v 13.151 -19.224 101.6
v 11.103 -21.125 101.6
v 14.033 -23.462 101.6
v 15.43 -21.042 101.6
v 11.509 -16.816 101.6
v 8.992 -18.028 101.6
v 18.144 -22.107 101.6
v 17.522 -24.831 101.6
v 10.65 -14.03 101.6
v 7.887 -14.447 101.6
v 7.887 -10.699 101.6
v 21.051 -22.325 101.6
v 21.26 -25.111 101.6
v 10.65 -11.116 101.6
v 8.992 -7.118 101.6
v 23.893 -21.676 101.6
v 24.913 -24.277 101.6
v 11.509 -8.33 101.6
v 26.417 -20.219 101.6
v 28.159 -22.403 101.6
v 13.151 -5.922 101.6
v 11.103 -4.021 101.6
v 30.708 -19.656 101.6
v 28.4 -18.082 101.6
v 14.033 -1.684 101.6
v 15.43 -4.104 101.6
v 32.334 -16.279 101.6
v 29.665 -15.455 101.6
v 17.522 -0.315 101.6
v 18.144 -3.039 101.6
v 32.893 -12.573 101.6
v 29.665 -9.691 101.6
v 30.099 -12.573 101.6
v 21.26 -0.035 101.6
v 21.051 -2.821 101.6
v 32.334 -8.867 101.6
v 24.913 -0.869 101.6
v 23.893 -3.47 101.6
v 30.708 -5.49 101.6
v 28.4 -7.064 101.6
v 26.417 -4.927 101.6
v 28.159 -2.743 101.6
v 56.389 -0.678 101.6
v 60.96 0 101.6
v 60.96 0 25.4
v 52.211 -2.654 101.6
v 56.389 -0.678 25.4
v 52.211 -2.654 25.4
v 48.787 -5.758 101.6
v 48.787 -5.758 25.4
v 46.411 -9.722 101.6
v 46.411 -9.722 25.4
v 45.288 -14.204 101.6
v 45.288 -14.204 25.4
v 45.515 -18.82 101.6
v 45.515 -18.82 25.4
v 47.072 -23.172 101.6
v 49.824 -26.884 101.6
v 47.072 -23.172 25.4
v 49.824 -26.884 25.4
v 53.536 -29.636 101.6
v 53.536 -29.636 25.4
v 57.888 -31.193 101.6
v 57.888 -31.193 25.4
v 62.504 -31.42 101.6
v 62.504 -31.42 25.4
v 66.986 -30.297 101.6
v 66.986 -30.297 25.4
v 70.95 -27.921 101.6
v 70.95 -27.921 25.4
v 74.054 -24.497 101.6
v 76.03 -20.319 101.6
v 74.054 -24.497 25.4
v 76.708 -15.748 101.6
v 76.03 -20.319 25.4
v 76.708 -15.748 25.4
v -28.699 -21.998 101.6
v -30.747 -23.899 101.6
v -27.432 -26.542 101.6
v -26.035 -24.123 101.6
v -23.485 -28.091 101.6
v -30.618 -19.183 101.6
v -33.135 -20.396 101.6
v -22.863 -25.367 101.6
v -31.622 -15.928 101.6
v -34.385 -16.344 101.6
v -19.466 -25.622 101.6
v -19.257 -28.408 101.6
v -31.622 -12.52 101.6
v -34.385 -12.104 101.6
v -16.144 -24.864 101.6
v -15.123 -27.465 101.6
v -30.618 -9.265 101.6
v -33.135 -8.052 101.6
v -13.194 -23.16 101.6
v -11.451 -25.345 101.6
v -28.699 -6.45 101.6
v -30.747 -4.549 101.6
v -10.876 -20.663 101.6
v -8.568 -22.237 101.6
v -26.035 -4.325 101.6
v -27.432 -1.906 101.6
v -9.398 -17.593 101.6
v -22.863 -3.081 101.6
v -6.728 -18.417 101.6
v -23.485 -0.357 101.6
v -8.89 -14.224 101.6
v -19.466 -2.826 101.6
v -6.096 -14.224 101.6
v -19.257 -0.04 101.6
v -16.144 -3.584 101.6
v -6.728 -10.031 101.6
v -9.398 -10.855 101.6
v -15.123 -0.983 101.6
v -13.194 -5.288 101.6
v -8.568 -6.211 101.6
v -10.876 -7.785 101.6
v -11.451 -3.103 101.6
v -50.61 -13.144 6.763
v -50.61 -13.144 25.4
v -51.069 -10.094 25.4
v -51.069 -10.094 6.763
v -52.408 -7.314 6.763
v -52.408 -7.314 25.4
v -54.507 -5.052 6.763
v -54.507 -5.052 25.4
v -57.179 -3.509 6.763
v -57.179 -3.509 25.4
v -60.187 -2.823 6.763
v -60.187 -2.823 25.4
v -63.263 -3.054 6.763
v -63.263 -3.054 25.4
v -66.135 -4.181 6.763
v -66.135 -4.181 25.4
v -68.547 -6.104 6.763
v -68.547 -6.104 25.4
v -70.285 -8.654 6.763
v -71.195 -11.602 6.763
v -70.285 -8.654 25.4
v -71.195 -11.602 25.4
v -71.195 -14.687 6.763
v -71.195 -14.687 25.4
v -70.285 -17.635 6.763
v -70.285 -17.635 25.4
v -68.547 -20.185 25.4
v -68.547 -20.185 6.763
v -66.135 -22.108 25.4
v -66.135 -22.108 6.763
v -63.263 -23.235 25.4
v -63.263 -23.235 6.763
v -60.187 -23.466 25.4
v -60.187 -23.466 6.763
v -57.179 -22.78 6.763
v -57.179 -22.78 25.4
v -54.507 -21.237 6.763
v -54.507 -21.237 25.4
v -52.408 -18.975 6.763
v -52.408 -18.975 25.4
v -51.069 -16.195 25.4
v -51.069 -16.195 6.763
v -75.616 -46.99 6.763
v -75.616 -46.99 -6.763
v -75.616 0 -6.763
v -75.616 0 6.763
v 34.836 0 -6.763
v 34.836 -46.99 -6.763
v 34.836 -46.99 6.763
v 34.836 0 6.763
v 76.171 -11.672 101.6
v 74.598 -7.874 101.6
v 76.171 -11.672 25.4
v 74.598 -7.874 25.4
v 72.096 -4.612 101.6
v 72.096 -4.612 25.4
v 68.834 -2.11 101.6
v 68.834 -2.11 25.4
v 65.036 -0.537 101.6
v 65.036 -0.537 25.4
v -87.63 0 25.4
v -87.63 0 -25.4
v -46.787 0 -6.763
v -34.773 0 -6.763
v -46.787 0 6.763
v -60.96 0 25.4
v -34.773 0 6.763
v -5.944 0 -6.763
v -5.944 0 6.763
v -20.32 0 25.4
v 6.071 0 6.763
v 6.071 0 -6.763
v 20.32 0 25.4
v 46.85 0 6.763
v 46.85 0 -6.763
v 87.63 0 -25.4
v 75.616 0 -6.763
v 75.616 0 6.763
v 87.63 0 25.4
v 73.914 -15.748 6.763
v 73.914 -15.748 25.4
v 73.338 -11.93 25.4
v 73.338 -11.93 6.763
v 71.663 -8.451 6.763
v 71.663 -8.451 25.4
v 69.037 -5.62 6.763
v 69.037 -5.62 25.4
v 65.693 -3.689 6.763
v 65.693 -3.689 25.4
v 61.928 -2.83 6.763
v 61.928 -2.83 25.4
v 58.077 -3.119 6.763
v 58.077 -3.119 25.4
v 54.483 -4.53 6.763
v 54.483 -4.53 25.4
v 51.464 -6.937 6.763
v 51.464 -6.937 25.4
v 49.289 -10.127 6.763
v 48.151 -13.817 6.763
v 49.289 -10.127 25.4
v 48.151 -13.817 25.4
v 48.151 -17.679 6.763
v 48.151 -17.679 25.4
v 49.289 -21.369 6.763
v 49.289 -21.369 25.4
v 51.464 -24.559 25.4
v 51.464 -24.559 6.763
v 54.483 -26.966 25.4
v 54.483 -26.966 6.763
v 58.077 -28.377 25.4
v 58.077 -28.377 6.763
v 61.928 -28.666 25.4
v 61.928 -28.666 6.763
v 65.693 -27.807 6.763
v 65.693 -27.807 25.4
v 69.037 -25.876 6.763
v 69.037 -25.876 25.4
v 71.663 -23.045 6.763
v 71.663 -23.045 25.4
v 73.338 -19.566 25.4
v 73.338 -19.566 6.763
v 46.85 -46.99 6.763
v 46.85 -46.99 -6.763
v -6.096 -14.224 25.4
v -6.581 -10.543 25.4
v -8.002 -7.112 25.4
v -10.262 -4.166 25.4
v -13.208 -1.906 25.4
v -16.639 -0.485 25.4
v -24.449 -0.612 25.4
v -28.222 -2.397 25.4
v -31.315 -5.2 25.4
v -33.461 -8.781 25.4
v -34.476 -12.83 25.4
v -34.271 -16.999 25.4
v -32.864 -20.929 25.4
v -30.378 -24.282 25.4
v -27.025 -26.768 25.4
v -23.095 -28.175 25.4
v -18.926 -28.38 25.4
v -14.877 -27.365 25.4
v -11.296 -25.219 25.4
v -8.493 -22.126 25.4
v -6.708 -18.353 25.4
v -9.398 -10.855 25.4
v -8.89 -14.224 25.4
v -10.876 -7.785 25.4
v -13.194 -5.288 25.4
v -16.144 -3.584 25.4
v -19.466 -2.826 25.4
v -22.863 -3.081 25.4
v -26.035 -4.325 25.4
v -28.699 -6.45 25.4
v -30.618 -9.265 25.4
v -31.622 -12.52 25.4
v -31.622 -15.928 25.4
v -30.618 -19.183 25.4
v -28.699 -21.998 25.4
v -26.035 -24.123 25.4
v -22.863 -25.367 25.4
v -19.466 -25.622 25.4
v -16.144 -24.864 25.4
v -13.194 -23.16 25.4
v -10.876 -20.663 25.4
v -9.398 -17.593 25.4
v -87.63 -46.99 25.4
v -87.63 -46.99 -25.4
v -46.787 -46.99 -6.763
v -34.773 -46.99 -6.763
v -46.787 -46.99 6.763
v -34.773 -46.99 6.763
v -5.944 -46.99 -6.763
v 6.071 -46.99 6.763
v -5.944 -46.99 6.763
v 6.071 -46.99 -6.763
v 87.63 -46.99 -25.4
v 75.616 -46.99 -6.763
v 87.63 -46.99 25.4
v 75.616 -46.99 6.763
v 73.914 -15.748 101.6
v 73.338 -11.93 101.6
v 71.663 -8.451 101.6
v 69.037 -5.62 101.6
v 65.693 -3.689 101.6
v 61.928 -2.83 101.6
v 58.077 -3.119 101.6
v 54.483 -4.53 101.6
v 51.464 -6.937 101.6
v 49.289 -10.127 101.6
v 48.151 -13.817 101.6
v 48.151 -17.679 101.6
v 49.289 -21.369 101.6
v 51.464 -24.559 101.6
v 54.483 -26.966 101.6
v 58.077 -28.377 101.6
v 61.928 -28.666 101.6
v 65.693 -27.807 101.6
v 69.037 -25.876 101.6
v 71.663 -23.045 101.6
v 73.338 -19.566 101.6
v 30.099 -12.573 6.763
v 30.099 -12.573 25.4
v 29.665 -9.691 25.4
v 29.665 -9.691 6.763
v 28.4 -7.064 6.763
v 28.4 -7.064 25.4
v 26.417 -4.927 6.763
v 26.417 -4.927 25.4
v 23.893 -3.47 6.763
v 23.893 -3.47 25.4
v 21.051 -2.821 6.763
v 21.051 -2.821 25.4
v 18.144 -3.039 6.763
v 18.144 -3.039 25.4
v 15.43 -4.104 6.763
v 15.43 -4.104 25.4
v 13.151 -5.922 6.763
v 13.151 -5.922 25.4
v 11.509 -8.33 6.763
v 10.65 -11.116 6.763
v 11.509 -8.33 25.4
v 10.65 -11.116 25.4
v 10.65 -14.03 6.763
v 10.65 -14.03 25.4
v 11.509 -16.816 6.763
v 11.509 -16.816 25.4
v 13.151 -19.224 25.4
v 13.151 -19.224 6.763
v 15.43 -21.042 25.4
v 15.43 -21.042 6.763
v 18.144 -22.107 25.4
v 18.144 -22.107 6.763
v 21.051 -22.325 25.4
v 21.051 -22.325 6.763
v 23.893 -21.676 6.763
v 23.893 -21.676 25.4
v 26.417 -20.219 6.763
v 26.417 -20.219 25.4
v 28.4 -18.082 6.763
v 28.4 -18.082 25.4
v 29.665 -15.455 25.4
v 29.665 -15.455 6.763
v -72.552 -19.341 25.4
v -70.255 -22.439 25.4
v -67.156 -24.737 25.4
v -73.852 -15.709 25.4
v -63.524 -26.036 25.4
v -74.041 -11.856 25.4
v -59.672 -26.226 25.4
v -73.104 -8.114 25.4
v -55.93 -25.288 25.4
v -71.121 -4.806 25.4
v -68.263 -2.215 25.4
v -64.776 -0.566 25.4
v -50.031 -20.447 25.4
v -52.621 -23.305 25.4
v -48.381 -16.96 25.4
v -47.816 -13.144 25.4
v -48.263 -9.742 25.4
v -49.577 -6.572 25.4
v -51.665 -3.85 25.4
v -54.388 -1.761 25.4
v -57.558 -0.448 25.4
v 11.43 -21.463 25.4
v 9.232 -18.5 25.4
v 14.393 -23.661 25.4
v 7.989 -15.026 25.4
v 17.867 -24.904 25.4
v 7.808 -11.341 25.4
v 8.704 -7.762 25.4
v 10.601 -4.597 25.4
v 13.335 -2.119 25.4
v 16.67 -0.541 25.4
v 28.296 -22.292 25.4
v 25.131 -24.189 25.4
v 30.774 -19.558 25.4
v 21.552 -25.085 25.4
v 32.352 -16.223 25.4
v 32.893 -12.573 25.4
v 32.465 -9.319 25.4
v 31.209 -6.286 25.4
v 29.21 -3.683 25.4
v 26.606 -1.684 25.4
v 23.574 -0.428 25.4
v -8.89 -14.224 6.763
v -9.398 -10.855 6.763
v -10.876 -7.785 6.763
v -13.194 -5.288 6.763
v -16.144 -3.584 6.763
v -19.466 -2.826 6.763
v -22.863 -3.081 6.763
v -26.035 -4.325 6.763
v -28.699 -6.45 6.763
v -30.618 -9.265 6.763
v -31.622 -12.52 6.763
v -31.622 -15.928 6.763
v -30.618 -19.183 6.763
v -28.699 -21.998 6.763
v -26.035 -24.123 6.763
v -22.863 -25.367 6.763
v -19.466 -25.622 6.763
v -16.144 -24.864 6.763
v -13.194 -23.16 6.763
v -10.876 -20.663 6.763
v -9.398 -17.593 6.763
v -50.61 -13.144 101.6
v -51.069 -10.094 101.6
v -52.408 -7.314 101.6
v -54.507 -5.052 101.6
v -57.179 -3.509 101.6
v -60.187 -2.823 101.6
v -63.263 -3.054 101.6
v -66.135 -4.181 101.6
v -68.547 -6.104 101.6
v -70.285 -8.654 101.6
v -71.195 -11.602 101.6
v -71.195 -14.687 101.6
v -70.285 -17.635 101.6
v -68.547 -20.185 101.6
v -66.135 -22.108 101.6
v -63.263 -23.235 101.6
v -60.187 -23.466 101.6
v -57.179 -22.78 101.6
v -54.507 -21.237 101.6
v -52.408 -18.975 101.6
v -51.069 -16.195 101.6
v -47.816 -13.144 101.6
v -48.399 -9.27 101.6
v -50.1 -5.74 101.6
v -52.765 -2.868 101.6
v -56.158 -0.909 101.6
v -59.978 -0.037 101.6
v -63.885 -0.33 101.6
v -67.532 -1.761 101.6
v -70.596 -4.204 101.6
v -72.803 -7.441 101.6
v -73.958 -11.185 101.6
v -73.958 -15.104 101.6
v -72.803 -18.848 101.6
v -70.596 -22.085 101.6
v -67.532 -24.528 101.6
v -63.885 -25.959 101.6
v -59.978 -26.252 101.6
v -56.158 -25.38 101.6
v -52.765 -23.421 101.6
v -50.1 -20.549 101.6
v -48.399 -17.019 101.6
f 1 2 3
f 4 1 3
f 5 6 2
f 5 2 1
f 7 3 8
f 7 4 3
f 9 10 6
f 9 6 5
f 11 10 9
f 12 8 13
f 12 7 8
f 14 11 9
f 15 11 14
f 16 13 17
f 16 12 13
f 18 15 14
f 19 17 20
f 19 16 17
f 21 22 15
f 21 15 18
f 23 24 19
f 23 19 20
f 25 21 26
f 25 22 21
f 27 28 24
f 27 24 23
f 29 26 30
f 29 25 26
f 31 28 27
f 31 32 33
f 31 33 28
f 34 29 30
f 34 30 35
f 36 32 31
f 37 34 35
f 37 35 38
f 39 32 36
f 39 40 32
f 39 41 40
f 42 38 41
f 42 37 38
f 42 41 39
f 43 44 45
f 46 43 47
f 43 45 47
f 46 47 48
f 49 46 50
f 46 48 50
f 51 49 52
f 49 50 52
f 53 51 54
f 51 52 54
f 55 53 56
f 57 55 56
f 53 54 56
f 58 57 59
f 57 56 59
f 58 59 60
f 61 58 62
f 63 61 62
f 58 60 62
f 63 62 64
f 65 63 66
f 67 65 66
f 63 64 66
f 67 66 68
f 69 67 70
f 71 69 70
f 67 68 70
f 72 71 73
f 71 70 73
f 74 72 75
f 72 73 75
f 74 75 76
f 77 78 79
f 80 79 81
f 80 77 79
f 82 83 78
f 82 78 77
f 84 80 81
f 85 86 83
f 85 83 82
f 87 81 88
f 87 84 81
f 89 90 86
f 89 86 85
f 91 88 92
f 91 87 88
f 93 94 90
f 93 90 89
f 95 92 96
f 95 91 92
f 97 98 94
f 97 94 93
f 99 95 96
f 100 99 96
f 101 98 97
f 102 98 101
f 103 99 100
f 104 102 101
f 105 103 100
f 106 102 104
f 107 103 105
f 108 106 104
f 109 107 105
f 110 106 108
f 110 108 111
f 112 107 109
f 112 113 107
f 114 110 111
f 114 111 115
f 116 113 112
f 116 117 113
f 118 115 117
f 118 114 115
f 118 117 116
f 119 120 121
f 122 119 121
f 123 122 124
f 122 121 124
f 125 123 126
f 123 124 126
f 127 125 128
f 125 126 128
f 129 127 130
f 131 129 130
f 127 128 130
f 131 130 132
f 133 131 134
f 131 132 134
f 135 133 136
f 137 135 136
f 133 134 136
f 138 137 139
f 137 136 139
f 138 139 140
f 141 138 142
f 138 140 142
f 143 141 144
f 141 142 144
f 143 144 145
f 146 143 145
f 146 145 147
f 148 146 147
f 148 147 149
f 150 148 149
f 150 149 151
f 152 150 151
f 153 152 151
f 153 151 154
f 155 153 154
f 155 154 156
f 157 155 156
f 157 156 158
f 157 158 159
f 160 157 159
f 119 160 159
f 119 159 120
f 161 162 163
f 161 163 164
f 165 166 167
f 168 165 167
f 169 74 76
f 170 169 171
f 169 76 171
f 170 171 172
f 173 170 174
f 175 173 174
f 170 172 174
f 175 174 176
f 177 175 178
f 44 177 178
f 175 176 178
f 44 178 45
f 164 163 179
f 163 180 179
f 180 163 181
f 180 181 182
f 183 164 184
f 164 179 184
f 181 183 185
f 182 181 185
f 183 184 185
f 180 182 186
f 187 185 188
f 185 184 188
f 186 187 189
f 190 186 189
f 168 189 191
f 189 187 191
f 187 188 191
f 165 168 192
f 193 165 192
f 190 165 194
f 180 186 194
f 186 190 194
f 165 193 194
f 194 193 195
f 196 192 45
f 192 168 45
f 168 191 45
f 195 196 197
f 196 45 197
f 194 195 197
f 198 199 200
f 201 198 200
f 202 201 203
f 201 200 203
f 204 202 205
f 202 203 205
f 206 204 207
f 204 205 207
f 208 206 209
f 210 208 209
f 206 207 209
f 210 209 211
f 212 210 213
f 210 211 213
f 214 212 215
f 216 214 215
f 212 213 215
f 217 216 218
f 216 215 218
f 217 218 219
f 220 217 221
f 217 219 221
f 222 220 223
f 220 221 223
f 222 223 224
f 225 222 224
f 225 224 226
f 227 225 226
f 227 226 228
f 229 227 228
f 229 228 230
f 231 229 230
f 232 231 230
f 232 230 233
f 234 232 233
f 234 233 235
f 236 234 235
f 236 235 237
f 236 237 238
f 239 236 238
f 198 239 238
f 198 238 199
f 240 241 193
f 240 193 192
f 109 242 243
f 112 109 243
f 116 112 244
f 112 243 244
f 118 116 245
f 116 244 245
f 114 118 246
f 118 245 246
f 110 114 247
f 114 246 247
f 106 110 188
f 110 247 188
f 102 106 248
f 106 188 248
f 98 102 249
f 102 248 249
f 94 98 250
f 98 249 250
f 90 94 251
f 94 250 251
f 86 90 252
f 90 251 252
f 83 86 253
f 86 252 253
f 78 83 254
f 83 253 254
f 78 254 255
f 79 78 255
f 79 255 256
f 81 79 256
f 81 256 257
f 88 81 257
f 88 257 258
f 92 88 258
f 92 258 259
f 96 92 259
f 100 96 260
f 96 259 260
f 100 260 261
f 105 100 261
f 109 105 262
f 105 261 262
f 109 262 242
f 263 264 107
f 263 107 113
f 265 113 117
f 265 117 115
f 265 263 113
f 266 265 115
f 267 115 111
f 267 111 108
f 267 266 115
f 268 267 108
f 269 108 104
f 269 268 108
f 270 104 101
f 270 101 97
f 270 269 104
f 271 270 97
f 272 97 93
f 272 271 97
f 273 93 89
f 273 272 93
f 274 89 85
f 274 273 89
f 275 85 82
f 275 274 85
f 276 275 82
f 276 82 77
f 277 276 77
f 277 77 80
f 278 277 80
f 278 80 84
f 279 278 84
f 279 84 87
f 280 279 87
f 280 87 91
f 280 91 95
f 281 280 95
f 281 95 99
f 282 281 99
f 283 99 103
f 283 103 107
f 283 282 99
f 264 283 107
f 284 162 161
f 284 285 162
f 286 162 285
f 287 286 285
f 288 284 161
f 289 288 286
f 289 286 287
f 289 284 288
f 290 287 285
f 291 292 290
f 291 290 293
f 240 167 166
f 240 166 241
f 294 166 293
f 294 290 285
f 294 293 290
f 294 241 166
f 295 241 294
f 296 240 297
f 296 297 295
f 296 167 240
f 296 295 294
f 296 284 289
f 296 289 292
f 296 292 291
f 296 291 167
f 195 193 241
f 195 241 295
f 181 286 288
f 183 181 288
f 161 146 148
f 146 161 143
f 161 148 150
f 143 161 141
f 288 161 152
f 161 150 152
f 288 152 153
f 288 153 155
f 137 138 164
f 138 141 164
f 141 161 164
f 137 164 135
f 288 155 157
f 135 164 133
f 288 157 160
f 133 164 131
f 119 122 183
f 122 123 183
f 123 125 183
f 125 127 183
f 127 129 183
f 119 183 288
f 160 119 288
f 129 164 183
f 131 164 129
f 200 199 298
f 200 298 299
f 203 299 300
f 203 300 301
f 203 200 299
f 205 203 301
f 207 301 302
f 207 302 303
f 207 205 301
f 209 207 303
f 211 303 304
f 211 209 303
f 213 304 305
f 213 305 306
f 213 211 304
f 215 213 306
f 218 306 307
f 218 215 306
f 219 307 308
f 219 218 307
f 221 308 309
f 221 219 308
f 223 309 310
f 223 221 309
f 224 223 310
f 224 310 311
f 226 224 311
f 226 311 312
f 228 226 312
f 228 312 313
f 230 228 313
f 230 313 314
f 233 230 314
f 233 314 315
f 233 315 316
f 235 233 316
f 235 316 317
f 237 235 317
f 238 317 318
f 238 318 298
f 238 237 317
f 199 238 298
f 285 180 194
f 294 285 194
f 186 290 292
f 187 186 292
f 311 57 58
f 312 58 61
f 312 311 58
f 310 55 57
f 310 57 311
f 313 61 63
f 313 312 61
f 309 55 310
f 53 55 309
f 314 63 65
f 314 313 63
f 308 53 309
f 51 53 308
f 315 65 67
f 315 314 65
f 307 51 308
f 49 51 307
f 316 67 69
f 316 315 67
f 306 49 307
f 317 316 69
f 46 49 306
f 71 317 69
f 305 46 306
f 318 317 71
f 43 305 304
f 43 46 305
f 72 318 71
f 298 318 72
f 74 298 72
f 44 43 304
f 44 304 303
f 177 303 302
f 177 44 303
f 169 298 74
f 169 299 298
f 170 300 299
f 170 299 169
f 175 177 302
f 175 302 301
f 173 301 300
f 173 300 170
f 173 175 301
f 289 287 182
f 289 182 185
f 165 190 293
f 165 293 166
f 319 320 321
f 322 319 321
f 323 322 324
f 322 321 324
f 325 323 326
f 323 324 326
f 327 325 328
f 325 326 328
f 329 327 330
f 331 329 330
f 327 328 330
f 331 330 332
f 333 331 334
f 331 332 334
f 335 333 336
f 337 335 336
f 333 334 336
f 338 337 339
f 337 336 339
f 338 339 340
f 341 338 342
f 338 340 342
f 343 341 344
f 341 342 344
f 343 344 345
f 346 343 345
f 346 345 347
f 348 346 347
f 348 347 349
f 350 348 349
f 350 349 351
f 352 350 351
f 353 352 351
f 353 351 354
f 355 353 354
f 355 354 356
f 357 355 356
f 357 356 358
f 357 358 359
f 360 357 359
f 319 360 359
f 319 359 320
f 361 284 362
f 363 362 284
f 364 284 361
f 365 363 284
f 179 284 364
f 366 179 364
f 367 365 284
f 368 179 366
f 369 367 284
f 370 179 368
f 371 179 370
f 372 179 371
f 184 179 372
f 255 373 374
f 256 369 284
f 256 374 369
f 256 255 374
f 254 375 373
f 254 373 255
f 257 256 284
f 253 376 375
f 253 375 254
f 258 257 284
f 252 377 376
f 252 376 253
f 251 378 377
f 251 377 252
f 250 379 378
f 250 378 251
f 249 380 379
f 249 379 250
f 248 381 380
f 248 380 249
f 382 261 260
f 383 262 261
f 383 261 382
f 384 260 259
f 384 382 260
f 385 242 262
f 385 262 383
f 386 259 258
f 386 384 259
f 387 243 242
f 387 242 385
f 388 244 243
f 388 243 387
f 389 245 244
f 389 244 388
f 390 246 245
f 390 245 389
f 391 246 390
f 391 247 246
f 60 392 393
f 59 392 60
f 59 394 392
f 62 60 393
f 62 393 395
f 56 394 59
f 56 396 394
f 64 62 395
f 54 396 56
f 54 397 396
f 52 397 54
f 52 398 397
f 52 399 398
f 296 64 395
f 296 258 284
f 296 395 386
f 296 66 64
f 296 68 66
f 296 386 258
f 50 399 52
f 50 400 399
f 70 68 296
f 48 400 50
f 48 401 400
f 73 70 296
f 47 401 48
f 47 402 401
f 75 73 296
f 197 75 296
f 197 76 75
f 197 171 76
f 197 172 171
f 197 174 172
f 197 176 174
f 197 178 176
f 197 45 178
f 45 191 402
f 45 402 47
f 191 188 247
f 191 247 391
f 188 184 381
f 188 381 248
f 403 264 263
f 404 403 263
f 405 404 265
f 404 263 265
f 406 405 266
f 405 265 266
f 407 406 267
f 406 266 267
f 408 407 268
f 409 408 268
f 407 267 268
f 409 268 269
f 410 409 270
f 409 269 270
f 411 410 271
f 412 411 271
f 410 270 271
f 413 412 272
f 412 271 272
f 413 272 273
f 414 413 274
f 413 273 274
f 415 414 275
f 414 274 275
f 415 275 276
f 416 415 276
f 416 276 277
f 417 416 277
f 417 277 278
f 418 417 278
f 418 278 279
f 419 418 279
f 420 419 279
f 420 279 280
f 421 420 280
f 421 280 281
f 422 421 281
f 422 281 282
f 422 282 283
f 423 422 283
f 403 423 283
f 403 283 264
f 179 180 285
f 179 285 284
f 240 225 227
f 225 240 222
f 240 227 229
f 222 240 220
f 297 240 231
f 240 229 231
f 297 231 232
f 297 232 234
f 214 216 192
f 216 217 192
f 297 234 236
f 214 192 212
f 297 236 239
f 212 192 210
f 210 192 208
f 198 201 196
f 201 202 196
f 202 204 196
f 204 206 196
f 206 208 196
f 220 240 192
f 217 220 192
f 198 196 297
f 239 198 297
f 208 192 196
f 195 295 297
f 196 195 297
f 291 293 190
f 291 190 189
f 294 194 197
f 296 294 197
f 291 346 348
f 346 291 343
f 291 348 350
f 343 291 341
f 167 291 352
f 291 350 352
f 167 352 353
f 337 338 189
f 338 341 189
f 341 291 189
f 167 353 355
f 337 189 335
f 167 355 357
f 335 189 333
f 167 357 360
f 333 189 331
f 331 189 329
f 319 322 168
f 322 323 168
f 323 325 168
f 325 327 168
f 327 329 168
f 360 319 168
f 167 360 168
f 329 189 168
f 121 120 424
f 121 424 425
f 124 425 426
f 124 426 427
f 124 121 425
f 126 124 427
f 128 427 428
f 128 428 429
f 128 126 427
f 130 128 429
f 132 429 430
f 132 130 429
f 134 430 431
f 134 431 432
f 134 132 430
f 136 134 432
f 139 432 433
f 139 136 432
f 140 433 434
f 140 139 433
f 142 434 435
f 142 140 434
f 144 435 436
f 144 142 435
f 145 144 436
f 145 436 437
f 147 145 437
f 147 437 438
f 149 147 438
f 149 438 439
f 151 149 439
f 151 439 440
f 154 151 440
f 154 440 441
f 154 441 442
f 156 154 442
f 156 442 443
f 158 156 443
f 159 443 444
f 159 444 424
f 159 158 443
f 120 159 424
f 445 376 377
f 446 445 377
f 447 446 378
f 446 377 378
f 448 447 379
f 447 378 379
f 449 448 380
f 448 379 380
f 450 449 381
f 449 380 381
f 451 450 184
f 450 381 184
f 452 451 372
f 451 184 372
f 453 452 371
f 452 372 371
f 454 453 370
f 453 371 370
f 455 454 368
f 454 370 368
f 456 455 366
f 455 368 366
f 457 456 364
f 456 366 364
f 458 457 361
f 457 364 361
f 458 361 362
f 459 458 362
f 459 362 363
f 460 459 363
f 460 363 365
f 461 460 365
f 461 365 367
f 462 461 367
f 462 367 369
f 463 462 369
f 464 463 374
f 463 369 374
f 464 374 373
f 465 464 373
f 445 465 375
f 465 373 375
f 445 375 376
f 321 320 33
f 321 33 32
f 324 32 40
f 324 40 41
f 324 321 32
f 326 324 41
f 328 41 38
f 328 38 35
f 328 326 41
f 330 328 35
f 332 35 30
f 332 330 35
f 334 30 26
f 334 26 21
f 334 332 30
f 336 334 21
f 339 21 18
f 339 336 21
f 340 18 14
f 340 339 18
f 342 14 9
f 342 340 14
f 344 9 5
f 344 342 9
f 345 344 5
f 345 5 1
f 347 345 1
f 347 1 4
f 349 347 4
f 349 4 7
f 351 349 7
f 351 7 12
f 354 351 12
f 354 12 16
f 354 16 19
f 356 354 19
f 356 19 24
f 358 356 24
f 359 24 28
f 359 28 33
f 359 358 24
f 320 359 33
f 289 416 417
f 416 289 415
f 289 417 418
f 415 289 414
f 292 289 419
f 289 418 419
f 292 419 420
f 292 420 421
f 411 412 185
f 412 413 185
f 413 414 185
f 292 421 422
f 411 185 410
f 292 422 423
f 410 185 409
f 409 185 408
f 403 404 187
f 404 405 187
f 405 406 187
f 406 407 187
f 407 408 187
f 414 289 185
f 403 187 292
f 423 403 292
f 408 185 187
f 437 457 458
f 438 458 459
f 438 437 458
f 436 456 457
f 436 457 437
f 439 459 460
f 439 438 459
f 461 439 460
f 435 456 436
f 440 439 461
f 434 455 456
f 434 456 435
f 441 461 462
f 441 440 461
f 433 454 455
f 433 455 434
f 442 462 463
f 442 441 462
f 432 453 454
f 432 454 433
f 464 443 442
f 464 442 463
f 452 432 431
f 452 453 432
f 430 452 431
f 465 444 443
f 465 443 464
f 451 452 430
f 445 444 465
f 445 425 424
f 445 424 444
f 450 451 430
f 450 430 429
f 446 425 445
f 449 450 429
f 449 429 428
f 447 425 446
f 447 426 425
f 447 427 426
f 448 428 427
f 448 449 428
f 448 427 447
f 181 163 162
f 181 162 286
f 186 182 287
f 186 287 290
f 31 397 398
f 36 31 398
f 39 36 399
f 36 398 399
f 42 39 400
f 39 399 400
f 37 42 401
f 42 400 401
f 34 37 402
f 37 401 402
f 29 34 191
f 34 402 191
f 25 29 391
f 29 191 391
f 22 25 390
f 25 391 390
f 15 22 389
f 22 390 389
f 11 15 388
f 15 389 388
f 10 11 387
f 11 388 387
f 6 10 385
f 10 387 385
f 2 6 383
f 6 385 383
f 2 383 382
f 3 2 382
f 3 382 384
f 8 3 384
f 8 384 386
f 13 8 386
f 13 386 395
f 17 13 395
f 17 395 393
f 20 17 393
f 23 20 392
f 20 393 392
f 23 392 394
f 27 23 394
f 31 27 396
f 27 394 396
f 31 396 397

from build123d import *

# Parameters (mm, degrees)
F0_W      = 175.26
F0_H      = 50.8
F0_W_2    = 28.829
F0_H_2    = 13.5255
F0_W_3    = 28.7655
F1_DEPTH  = 46.99
F2_R      = 12.954
F3_DEPTH  = 76.2
F4_DEPTH  = 25.4
F5_R      = 12.573
F5_R_2    = 9.779
F6_DEPTH  = 76.2
F7_DEPTH  = 25.4
F8_R      = 11.43
F9_DEPTH  = 76.2
F10_DEPTH = 25.4
F11_R     = 13.1445
F11_R_2   = 10.3505
F12_DEPTH = 76.2
F13_DEPTH = 25.4


with BuildPart() as f1:
    # F0 (on Front) → F1 (new body)
    with BuildSketch(Plane.XZ):
        Rectangle(F0_W, F0_H)
        with Locations((-61.2013, 0)):
            Rectangle(F0_W_2, F0_H_2, mode=Mode.SUBTRACT)
        with Locations((-20.3581, 0)):
            Rectangle(F0_W_2, F0_H_2, mode=Mode.SUBTRACT)
        with Locations((20.45335, 0)):
            Rectangle(F0_W_3, F0_H_2, mode=Mode.SUBTRACT)
        with Locations((61.23305, 0)):
            Rectangle(F0_W_3, F0_H_2, mode=Mode.SUBTRACT)
    extrude(amount=F1_DEPTH)

    # F2 (on face) → F3 (join)
    with BuildSketch(Plane.XY.offset(25.4)):
        with BuildLine():
            ThreePointArc((60.96, 0), (49.8244824099, -26.8835175901), (76.708, -15.748))
            ThreePointArc((76.708, -15.748), (72.0955175901, -4.6124824099), (60.96, 0))
        make_face()
        with Locations((60.96, -15.748)):
            Circle(F2_R, mode=Mode.SUBTRACT)
    extrude(amount=F3_DEPTH)

    # F4 (cut): a face of the model
    f4_faces = [f1.faces().sort_by_distance(p)[0] for p in [
        (60.96, -15.748, 25.4),
    ]]
    extrude(f4_faces, amount=-F4_DEPTH, mode=Mode.SUBTRACT)

    # F5 (on face) → F6 (join)
    with BuildSketch(Plane.XY.offset(25.4)):
        with Locations((20.32, -12.573)):
            Circle(F5_R)
        with Locations((20.32, -12.573)):
            Circle(F5_R_2, mode=Mode.SUBTRACT)
    extrude(amount=F6_DEPTH)

    # F7 (cut): a face of the model
    f7_faces = [f1.faces().sort_by_distance(p)[0] for p in [
        (20.32, -12.573, 25.4),
    ]]
    extrude(f7_faces, amount=-F7_DEPTH, mode=Mode.SUBTRACT)

    # F8 (on face) → F9 (join)
    with BuildSketch(Plane.XY.offset(25.4)):
        with BuildLine():
            ThreePointArc((-20.319999941, 0), (-30.3778868765, -24.2818868347), (-6.096, -14.224))
            ThreePointArc((-6.096, -14.224), (-10.2621131235, -4.1661131653), (-20.319999941, 0))
        make_face()
        with Locations((-20.32, -14.224)):
            Circle(F8_R, mode=Mode.SUBTRACT)
    extrude(amount=F9_DEPTH)

    # F10 (cut): a face of the model
    f10_faces = [f1.faces().sort_by_distance(p)[0] for p in [
        (-20.32, -14.224, 25.4),
    ]]
    extrude(f10_faces, amount=-F10_DEPTH, mode=Mode.SUBTRACT)

    # F11 (on face) → F12 (join)
    with BuildSketch(Plane.XY.offset(25.4)):
        with Locations((-60.96, -13.1445)):
            Circle(F11_R)
        with Locations((-60.96, -13.1445)):
            Circle(F11_R_2, mode=Mode.SUBTRACT)
    extrude(amount=F12_DEPTH)

    # F13 (cut): a face of the model
    f13_faces = [f1.faces().sort_by_distance(p)[0] for p in [
        (-60.96, -13.1445, 25.4),
    ]]
    extrude(f13_faces, amount=-F13_DEPTH, mode=Mode.SUBTRACT)


solid = f1.part
